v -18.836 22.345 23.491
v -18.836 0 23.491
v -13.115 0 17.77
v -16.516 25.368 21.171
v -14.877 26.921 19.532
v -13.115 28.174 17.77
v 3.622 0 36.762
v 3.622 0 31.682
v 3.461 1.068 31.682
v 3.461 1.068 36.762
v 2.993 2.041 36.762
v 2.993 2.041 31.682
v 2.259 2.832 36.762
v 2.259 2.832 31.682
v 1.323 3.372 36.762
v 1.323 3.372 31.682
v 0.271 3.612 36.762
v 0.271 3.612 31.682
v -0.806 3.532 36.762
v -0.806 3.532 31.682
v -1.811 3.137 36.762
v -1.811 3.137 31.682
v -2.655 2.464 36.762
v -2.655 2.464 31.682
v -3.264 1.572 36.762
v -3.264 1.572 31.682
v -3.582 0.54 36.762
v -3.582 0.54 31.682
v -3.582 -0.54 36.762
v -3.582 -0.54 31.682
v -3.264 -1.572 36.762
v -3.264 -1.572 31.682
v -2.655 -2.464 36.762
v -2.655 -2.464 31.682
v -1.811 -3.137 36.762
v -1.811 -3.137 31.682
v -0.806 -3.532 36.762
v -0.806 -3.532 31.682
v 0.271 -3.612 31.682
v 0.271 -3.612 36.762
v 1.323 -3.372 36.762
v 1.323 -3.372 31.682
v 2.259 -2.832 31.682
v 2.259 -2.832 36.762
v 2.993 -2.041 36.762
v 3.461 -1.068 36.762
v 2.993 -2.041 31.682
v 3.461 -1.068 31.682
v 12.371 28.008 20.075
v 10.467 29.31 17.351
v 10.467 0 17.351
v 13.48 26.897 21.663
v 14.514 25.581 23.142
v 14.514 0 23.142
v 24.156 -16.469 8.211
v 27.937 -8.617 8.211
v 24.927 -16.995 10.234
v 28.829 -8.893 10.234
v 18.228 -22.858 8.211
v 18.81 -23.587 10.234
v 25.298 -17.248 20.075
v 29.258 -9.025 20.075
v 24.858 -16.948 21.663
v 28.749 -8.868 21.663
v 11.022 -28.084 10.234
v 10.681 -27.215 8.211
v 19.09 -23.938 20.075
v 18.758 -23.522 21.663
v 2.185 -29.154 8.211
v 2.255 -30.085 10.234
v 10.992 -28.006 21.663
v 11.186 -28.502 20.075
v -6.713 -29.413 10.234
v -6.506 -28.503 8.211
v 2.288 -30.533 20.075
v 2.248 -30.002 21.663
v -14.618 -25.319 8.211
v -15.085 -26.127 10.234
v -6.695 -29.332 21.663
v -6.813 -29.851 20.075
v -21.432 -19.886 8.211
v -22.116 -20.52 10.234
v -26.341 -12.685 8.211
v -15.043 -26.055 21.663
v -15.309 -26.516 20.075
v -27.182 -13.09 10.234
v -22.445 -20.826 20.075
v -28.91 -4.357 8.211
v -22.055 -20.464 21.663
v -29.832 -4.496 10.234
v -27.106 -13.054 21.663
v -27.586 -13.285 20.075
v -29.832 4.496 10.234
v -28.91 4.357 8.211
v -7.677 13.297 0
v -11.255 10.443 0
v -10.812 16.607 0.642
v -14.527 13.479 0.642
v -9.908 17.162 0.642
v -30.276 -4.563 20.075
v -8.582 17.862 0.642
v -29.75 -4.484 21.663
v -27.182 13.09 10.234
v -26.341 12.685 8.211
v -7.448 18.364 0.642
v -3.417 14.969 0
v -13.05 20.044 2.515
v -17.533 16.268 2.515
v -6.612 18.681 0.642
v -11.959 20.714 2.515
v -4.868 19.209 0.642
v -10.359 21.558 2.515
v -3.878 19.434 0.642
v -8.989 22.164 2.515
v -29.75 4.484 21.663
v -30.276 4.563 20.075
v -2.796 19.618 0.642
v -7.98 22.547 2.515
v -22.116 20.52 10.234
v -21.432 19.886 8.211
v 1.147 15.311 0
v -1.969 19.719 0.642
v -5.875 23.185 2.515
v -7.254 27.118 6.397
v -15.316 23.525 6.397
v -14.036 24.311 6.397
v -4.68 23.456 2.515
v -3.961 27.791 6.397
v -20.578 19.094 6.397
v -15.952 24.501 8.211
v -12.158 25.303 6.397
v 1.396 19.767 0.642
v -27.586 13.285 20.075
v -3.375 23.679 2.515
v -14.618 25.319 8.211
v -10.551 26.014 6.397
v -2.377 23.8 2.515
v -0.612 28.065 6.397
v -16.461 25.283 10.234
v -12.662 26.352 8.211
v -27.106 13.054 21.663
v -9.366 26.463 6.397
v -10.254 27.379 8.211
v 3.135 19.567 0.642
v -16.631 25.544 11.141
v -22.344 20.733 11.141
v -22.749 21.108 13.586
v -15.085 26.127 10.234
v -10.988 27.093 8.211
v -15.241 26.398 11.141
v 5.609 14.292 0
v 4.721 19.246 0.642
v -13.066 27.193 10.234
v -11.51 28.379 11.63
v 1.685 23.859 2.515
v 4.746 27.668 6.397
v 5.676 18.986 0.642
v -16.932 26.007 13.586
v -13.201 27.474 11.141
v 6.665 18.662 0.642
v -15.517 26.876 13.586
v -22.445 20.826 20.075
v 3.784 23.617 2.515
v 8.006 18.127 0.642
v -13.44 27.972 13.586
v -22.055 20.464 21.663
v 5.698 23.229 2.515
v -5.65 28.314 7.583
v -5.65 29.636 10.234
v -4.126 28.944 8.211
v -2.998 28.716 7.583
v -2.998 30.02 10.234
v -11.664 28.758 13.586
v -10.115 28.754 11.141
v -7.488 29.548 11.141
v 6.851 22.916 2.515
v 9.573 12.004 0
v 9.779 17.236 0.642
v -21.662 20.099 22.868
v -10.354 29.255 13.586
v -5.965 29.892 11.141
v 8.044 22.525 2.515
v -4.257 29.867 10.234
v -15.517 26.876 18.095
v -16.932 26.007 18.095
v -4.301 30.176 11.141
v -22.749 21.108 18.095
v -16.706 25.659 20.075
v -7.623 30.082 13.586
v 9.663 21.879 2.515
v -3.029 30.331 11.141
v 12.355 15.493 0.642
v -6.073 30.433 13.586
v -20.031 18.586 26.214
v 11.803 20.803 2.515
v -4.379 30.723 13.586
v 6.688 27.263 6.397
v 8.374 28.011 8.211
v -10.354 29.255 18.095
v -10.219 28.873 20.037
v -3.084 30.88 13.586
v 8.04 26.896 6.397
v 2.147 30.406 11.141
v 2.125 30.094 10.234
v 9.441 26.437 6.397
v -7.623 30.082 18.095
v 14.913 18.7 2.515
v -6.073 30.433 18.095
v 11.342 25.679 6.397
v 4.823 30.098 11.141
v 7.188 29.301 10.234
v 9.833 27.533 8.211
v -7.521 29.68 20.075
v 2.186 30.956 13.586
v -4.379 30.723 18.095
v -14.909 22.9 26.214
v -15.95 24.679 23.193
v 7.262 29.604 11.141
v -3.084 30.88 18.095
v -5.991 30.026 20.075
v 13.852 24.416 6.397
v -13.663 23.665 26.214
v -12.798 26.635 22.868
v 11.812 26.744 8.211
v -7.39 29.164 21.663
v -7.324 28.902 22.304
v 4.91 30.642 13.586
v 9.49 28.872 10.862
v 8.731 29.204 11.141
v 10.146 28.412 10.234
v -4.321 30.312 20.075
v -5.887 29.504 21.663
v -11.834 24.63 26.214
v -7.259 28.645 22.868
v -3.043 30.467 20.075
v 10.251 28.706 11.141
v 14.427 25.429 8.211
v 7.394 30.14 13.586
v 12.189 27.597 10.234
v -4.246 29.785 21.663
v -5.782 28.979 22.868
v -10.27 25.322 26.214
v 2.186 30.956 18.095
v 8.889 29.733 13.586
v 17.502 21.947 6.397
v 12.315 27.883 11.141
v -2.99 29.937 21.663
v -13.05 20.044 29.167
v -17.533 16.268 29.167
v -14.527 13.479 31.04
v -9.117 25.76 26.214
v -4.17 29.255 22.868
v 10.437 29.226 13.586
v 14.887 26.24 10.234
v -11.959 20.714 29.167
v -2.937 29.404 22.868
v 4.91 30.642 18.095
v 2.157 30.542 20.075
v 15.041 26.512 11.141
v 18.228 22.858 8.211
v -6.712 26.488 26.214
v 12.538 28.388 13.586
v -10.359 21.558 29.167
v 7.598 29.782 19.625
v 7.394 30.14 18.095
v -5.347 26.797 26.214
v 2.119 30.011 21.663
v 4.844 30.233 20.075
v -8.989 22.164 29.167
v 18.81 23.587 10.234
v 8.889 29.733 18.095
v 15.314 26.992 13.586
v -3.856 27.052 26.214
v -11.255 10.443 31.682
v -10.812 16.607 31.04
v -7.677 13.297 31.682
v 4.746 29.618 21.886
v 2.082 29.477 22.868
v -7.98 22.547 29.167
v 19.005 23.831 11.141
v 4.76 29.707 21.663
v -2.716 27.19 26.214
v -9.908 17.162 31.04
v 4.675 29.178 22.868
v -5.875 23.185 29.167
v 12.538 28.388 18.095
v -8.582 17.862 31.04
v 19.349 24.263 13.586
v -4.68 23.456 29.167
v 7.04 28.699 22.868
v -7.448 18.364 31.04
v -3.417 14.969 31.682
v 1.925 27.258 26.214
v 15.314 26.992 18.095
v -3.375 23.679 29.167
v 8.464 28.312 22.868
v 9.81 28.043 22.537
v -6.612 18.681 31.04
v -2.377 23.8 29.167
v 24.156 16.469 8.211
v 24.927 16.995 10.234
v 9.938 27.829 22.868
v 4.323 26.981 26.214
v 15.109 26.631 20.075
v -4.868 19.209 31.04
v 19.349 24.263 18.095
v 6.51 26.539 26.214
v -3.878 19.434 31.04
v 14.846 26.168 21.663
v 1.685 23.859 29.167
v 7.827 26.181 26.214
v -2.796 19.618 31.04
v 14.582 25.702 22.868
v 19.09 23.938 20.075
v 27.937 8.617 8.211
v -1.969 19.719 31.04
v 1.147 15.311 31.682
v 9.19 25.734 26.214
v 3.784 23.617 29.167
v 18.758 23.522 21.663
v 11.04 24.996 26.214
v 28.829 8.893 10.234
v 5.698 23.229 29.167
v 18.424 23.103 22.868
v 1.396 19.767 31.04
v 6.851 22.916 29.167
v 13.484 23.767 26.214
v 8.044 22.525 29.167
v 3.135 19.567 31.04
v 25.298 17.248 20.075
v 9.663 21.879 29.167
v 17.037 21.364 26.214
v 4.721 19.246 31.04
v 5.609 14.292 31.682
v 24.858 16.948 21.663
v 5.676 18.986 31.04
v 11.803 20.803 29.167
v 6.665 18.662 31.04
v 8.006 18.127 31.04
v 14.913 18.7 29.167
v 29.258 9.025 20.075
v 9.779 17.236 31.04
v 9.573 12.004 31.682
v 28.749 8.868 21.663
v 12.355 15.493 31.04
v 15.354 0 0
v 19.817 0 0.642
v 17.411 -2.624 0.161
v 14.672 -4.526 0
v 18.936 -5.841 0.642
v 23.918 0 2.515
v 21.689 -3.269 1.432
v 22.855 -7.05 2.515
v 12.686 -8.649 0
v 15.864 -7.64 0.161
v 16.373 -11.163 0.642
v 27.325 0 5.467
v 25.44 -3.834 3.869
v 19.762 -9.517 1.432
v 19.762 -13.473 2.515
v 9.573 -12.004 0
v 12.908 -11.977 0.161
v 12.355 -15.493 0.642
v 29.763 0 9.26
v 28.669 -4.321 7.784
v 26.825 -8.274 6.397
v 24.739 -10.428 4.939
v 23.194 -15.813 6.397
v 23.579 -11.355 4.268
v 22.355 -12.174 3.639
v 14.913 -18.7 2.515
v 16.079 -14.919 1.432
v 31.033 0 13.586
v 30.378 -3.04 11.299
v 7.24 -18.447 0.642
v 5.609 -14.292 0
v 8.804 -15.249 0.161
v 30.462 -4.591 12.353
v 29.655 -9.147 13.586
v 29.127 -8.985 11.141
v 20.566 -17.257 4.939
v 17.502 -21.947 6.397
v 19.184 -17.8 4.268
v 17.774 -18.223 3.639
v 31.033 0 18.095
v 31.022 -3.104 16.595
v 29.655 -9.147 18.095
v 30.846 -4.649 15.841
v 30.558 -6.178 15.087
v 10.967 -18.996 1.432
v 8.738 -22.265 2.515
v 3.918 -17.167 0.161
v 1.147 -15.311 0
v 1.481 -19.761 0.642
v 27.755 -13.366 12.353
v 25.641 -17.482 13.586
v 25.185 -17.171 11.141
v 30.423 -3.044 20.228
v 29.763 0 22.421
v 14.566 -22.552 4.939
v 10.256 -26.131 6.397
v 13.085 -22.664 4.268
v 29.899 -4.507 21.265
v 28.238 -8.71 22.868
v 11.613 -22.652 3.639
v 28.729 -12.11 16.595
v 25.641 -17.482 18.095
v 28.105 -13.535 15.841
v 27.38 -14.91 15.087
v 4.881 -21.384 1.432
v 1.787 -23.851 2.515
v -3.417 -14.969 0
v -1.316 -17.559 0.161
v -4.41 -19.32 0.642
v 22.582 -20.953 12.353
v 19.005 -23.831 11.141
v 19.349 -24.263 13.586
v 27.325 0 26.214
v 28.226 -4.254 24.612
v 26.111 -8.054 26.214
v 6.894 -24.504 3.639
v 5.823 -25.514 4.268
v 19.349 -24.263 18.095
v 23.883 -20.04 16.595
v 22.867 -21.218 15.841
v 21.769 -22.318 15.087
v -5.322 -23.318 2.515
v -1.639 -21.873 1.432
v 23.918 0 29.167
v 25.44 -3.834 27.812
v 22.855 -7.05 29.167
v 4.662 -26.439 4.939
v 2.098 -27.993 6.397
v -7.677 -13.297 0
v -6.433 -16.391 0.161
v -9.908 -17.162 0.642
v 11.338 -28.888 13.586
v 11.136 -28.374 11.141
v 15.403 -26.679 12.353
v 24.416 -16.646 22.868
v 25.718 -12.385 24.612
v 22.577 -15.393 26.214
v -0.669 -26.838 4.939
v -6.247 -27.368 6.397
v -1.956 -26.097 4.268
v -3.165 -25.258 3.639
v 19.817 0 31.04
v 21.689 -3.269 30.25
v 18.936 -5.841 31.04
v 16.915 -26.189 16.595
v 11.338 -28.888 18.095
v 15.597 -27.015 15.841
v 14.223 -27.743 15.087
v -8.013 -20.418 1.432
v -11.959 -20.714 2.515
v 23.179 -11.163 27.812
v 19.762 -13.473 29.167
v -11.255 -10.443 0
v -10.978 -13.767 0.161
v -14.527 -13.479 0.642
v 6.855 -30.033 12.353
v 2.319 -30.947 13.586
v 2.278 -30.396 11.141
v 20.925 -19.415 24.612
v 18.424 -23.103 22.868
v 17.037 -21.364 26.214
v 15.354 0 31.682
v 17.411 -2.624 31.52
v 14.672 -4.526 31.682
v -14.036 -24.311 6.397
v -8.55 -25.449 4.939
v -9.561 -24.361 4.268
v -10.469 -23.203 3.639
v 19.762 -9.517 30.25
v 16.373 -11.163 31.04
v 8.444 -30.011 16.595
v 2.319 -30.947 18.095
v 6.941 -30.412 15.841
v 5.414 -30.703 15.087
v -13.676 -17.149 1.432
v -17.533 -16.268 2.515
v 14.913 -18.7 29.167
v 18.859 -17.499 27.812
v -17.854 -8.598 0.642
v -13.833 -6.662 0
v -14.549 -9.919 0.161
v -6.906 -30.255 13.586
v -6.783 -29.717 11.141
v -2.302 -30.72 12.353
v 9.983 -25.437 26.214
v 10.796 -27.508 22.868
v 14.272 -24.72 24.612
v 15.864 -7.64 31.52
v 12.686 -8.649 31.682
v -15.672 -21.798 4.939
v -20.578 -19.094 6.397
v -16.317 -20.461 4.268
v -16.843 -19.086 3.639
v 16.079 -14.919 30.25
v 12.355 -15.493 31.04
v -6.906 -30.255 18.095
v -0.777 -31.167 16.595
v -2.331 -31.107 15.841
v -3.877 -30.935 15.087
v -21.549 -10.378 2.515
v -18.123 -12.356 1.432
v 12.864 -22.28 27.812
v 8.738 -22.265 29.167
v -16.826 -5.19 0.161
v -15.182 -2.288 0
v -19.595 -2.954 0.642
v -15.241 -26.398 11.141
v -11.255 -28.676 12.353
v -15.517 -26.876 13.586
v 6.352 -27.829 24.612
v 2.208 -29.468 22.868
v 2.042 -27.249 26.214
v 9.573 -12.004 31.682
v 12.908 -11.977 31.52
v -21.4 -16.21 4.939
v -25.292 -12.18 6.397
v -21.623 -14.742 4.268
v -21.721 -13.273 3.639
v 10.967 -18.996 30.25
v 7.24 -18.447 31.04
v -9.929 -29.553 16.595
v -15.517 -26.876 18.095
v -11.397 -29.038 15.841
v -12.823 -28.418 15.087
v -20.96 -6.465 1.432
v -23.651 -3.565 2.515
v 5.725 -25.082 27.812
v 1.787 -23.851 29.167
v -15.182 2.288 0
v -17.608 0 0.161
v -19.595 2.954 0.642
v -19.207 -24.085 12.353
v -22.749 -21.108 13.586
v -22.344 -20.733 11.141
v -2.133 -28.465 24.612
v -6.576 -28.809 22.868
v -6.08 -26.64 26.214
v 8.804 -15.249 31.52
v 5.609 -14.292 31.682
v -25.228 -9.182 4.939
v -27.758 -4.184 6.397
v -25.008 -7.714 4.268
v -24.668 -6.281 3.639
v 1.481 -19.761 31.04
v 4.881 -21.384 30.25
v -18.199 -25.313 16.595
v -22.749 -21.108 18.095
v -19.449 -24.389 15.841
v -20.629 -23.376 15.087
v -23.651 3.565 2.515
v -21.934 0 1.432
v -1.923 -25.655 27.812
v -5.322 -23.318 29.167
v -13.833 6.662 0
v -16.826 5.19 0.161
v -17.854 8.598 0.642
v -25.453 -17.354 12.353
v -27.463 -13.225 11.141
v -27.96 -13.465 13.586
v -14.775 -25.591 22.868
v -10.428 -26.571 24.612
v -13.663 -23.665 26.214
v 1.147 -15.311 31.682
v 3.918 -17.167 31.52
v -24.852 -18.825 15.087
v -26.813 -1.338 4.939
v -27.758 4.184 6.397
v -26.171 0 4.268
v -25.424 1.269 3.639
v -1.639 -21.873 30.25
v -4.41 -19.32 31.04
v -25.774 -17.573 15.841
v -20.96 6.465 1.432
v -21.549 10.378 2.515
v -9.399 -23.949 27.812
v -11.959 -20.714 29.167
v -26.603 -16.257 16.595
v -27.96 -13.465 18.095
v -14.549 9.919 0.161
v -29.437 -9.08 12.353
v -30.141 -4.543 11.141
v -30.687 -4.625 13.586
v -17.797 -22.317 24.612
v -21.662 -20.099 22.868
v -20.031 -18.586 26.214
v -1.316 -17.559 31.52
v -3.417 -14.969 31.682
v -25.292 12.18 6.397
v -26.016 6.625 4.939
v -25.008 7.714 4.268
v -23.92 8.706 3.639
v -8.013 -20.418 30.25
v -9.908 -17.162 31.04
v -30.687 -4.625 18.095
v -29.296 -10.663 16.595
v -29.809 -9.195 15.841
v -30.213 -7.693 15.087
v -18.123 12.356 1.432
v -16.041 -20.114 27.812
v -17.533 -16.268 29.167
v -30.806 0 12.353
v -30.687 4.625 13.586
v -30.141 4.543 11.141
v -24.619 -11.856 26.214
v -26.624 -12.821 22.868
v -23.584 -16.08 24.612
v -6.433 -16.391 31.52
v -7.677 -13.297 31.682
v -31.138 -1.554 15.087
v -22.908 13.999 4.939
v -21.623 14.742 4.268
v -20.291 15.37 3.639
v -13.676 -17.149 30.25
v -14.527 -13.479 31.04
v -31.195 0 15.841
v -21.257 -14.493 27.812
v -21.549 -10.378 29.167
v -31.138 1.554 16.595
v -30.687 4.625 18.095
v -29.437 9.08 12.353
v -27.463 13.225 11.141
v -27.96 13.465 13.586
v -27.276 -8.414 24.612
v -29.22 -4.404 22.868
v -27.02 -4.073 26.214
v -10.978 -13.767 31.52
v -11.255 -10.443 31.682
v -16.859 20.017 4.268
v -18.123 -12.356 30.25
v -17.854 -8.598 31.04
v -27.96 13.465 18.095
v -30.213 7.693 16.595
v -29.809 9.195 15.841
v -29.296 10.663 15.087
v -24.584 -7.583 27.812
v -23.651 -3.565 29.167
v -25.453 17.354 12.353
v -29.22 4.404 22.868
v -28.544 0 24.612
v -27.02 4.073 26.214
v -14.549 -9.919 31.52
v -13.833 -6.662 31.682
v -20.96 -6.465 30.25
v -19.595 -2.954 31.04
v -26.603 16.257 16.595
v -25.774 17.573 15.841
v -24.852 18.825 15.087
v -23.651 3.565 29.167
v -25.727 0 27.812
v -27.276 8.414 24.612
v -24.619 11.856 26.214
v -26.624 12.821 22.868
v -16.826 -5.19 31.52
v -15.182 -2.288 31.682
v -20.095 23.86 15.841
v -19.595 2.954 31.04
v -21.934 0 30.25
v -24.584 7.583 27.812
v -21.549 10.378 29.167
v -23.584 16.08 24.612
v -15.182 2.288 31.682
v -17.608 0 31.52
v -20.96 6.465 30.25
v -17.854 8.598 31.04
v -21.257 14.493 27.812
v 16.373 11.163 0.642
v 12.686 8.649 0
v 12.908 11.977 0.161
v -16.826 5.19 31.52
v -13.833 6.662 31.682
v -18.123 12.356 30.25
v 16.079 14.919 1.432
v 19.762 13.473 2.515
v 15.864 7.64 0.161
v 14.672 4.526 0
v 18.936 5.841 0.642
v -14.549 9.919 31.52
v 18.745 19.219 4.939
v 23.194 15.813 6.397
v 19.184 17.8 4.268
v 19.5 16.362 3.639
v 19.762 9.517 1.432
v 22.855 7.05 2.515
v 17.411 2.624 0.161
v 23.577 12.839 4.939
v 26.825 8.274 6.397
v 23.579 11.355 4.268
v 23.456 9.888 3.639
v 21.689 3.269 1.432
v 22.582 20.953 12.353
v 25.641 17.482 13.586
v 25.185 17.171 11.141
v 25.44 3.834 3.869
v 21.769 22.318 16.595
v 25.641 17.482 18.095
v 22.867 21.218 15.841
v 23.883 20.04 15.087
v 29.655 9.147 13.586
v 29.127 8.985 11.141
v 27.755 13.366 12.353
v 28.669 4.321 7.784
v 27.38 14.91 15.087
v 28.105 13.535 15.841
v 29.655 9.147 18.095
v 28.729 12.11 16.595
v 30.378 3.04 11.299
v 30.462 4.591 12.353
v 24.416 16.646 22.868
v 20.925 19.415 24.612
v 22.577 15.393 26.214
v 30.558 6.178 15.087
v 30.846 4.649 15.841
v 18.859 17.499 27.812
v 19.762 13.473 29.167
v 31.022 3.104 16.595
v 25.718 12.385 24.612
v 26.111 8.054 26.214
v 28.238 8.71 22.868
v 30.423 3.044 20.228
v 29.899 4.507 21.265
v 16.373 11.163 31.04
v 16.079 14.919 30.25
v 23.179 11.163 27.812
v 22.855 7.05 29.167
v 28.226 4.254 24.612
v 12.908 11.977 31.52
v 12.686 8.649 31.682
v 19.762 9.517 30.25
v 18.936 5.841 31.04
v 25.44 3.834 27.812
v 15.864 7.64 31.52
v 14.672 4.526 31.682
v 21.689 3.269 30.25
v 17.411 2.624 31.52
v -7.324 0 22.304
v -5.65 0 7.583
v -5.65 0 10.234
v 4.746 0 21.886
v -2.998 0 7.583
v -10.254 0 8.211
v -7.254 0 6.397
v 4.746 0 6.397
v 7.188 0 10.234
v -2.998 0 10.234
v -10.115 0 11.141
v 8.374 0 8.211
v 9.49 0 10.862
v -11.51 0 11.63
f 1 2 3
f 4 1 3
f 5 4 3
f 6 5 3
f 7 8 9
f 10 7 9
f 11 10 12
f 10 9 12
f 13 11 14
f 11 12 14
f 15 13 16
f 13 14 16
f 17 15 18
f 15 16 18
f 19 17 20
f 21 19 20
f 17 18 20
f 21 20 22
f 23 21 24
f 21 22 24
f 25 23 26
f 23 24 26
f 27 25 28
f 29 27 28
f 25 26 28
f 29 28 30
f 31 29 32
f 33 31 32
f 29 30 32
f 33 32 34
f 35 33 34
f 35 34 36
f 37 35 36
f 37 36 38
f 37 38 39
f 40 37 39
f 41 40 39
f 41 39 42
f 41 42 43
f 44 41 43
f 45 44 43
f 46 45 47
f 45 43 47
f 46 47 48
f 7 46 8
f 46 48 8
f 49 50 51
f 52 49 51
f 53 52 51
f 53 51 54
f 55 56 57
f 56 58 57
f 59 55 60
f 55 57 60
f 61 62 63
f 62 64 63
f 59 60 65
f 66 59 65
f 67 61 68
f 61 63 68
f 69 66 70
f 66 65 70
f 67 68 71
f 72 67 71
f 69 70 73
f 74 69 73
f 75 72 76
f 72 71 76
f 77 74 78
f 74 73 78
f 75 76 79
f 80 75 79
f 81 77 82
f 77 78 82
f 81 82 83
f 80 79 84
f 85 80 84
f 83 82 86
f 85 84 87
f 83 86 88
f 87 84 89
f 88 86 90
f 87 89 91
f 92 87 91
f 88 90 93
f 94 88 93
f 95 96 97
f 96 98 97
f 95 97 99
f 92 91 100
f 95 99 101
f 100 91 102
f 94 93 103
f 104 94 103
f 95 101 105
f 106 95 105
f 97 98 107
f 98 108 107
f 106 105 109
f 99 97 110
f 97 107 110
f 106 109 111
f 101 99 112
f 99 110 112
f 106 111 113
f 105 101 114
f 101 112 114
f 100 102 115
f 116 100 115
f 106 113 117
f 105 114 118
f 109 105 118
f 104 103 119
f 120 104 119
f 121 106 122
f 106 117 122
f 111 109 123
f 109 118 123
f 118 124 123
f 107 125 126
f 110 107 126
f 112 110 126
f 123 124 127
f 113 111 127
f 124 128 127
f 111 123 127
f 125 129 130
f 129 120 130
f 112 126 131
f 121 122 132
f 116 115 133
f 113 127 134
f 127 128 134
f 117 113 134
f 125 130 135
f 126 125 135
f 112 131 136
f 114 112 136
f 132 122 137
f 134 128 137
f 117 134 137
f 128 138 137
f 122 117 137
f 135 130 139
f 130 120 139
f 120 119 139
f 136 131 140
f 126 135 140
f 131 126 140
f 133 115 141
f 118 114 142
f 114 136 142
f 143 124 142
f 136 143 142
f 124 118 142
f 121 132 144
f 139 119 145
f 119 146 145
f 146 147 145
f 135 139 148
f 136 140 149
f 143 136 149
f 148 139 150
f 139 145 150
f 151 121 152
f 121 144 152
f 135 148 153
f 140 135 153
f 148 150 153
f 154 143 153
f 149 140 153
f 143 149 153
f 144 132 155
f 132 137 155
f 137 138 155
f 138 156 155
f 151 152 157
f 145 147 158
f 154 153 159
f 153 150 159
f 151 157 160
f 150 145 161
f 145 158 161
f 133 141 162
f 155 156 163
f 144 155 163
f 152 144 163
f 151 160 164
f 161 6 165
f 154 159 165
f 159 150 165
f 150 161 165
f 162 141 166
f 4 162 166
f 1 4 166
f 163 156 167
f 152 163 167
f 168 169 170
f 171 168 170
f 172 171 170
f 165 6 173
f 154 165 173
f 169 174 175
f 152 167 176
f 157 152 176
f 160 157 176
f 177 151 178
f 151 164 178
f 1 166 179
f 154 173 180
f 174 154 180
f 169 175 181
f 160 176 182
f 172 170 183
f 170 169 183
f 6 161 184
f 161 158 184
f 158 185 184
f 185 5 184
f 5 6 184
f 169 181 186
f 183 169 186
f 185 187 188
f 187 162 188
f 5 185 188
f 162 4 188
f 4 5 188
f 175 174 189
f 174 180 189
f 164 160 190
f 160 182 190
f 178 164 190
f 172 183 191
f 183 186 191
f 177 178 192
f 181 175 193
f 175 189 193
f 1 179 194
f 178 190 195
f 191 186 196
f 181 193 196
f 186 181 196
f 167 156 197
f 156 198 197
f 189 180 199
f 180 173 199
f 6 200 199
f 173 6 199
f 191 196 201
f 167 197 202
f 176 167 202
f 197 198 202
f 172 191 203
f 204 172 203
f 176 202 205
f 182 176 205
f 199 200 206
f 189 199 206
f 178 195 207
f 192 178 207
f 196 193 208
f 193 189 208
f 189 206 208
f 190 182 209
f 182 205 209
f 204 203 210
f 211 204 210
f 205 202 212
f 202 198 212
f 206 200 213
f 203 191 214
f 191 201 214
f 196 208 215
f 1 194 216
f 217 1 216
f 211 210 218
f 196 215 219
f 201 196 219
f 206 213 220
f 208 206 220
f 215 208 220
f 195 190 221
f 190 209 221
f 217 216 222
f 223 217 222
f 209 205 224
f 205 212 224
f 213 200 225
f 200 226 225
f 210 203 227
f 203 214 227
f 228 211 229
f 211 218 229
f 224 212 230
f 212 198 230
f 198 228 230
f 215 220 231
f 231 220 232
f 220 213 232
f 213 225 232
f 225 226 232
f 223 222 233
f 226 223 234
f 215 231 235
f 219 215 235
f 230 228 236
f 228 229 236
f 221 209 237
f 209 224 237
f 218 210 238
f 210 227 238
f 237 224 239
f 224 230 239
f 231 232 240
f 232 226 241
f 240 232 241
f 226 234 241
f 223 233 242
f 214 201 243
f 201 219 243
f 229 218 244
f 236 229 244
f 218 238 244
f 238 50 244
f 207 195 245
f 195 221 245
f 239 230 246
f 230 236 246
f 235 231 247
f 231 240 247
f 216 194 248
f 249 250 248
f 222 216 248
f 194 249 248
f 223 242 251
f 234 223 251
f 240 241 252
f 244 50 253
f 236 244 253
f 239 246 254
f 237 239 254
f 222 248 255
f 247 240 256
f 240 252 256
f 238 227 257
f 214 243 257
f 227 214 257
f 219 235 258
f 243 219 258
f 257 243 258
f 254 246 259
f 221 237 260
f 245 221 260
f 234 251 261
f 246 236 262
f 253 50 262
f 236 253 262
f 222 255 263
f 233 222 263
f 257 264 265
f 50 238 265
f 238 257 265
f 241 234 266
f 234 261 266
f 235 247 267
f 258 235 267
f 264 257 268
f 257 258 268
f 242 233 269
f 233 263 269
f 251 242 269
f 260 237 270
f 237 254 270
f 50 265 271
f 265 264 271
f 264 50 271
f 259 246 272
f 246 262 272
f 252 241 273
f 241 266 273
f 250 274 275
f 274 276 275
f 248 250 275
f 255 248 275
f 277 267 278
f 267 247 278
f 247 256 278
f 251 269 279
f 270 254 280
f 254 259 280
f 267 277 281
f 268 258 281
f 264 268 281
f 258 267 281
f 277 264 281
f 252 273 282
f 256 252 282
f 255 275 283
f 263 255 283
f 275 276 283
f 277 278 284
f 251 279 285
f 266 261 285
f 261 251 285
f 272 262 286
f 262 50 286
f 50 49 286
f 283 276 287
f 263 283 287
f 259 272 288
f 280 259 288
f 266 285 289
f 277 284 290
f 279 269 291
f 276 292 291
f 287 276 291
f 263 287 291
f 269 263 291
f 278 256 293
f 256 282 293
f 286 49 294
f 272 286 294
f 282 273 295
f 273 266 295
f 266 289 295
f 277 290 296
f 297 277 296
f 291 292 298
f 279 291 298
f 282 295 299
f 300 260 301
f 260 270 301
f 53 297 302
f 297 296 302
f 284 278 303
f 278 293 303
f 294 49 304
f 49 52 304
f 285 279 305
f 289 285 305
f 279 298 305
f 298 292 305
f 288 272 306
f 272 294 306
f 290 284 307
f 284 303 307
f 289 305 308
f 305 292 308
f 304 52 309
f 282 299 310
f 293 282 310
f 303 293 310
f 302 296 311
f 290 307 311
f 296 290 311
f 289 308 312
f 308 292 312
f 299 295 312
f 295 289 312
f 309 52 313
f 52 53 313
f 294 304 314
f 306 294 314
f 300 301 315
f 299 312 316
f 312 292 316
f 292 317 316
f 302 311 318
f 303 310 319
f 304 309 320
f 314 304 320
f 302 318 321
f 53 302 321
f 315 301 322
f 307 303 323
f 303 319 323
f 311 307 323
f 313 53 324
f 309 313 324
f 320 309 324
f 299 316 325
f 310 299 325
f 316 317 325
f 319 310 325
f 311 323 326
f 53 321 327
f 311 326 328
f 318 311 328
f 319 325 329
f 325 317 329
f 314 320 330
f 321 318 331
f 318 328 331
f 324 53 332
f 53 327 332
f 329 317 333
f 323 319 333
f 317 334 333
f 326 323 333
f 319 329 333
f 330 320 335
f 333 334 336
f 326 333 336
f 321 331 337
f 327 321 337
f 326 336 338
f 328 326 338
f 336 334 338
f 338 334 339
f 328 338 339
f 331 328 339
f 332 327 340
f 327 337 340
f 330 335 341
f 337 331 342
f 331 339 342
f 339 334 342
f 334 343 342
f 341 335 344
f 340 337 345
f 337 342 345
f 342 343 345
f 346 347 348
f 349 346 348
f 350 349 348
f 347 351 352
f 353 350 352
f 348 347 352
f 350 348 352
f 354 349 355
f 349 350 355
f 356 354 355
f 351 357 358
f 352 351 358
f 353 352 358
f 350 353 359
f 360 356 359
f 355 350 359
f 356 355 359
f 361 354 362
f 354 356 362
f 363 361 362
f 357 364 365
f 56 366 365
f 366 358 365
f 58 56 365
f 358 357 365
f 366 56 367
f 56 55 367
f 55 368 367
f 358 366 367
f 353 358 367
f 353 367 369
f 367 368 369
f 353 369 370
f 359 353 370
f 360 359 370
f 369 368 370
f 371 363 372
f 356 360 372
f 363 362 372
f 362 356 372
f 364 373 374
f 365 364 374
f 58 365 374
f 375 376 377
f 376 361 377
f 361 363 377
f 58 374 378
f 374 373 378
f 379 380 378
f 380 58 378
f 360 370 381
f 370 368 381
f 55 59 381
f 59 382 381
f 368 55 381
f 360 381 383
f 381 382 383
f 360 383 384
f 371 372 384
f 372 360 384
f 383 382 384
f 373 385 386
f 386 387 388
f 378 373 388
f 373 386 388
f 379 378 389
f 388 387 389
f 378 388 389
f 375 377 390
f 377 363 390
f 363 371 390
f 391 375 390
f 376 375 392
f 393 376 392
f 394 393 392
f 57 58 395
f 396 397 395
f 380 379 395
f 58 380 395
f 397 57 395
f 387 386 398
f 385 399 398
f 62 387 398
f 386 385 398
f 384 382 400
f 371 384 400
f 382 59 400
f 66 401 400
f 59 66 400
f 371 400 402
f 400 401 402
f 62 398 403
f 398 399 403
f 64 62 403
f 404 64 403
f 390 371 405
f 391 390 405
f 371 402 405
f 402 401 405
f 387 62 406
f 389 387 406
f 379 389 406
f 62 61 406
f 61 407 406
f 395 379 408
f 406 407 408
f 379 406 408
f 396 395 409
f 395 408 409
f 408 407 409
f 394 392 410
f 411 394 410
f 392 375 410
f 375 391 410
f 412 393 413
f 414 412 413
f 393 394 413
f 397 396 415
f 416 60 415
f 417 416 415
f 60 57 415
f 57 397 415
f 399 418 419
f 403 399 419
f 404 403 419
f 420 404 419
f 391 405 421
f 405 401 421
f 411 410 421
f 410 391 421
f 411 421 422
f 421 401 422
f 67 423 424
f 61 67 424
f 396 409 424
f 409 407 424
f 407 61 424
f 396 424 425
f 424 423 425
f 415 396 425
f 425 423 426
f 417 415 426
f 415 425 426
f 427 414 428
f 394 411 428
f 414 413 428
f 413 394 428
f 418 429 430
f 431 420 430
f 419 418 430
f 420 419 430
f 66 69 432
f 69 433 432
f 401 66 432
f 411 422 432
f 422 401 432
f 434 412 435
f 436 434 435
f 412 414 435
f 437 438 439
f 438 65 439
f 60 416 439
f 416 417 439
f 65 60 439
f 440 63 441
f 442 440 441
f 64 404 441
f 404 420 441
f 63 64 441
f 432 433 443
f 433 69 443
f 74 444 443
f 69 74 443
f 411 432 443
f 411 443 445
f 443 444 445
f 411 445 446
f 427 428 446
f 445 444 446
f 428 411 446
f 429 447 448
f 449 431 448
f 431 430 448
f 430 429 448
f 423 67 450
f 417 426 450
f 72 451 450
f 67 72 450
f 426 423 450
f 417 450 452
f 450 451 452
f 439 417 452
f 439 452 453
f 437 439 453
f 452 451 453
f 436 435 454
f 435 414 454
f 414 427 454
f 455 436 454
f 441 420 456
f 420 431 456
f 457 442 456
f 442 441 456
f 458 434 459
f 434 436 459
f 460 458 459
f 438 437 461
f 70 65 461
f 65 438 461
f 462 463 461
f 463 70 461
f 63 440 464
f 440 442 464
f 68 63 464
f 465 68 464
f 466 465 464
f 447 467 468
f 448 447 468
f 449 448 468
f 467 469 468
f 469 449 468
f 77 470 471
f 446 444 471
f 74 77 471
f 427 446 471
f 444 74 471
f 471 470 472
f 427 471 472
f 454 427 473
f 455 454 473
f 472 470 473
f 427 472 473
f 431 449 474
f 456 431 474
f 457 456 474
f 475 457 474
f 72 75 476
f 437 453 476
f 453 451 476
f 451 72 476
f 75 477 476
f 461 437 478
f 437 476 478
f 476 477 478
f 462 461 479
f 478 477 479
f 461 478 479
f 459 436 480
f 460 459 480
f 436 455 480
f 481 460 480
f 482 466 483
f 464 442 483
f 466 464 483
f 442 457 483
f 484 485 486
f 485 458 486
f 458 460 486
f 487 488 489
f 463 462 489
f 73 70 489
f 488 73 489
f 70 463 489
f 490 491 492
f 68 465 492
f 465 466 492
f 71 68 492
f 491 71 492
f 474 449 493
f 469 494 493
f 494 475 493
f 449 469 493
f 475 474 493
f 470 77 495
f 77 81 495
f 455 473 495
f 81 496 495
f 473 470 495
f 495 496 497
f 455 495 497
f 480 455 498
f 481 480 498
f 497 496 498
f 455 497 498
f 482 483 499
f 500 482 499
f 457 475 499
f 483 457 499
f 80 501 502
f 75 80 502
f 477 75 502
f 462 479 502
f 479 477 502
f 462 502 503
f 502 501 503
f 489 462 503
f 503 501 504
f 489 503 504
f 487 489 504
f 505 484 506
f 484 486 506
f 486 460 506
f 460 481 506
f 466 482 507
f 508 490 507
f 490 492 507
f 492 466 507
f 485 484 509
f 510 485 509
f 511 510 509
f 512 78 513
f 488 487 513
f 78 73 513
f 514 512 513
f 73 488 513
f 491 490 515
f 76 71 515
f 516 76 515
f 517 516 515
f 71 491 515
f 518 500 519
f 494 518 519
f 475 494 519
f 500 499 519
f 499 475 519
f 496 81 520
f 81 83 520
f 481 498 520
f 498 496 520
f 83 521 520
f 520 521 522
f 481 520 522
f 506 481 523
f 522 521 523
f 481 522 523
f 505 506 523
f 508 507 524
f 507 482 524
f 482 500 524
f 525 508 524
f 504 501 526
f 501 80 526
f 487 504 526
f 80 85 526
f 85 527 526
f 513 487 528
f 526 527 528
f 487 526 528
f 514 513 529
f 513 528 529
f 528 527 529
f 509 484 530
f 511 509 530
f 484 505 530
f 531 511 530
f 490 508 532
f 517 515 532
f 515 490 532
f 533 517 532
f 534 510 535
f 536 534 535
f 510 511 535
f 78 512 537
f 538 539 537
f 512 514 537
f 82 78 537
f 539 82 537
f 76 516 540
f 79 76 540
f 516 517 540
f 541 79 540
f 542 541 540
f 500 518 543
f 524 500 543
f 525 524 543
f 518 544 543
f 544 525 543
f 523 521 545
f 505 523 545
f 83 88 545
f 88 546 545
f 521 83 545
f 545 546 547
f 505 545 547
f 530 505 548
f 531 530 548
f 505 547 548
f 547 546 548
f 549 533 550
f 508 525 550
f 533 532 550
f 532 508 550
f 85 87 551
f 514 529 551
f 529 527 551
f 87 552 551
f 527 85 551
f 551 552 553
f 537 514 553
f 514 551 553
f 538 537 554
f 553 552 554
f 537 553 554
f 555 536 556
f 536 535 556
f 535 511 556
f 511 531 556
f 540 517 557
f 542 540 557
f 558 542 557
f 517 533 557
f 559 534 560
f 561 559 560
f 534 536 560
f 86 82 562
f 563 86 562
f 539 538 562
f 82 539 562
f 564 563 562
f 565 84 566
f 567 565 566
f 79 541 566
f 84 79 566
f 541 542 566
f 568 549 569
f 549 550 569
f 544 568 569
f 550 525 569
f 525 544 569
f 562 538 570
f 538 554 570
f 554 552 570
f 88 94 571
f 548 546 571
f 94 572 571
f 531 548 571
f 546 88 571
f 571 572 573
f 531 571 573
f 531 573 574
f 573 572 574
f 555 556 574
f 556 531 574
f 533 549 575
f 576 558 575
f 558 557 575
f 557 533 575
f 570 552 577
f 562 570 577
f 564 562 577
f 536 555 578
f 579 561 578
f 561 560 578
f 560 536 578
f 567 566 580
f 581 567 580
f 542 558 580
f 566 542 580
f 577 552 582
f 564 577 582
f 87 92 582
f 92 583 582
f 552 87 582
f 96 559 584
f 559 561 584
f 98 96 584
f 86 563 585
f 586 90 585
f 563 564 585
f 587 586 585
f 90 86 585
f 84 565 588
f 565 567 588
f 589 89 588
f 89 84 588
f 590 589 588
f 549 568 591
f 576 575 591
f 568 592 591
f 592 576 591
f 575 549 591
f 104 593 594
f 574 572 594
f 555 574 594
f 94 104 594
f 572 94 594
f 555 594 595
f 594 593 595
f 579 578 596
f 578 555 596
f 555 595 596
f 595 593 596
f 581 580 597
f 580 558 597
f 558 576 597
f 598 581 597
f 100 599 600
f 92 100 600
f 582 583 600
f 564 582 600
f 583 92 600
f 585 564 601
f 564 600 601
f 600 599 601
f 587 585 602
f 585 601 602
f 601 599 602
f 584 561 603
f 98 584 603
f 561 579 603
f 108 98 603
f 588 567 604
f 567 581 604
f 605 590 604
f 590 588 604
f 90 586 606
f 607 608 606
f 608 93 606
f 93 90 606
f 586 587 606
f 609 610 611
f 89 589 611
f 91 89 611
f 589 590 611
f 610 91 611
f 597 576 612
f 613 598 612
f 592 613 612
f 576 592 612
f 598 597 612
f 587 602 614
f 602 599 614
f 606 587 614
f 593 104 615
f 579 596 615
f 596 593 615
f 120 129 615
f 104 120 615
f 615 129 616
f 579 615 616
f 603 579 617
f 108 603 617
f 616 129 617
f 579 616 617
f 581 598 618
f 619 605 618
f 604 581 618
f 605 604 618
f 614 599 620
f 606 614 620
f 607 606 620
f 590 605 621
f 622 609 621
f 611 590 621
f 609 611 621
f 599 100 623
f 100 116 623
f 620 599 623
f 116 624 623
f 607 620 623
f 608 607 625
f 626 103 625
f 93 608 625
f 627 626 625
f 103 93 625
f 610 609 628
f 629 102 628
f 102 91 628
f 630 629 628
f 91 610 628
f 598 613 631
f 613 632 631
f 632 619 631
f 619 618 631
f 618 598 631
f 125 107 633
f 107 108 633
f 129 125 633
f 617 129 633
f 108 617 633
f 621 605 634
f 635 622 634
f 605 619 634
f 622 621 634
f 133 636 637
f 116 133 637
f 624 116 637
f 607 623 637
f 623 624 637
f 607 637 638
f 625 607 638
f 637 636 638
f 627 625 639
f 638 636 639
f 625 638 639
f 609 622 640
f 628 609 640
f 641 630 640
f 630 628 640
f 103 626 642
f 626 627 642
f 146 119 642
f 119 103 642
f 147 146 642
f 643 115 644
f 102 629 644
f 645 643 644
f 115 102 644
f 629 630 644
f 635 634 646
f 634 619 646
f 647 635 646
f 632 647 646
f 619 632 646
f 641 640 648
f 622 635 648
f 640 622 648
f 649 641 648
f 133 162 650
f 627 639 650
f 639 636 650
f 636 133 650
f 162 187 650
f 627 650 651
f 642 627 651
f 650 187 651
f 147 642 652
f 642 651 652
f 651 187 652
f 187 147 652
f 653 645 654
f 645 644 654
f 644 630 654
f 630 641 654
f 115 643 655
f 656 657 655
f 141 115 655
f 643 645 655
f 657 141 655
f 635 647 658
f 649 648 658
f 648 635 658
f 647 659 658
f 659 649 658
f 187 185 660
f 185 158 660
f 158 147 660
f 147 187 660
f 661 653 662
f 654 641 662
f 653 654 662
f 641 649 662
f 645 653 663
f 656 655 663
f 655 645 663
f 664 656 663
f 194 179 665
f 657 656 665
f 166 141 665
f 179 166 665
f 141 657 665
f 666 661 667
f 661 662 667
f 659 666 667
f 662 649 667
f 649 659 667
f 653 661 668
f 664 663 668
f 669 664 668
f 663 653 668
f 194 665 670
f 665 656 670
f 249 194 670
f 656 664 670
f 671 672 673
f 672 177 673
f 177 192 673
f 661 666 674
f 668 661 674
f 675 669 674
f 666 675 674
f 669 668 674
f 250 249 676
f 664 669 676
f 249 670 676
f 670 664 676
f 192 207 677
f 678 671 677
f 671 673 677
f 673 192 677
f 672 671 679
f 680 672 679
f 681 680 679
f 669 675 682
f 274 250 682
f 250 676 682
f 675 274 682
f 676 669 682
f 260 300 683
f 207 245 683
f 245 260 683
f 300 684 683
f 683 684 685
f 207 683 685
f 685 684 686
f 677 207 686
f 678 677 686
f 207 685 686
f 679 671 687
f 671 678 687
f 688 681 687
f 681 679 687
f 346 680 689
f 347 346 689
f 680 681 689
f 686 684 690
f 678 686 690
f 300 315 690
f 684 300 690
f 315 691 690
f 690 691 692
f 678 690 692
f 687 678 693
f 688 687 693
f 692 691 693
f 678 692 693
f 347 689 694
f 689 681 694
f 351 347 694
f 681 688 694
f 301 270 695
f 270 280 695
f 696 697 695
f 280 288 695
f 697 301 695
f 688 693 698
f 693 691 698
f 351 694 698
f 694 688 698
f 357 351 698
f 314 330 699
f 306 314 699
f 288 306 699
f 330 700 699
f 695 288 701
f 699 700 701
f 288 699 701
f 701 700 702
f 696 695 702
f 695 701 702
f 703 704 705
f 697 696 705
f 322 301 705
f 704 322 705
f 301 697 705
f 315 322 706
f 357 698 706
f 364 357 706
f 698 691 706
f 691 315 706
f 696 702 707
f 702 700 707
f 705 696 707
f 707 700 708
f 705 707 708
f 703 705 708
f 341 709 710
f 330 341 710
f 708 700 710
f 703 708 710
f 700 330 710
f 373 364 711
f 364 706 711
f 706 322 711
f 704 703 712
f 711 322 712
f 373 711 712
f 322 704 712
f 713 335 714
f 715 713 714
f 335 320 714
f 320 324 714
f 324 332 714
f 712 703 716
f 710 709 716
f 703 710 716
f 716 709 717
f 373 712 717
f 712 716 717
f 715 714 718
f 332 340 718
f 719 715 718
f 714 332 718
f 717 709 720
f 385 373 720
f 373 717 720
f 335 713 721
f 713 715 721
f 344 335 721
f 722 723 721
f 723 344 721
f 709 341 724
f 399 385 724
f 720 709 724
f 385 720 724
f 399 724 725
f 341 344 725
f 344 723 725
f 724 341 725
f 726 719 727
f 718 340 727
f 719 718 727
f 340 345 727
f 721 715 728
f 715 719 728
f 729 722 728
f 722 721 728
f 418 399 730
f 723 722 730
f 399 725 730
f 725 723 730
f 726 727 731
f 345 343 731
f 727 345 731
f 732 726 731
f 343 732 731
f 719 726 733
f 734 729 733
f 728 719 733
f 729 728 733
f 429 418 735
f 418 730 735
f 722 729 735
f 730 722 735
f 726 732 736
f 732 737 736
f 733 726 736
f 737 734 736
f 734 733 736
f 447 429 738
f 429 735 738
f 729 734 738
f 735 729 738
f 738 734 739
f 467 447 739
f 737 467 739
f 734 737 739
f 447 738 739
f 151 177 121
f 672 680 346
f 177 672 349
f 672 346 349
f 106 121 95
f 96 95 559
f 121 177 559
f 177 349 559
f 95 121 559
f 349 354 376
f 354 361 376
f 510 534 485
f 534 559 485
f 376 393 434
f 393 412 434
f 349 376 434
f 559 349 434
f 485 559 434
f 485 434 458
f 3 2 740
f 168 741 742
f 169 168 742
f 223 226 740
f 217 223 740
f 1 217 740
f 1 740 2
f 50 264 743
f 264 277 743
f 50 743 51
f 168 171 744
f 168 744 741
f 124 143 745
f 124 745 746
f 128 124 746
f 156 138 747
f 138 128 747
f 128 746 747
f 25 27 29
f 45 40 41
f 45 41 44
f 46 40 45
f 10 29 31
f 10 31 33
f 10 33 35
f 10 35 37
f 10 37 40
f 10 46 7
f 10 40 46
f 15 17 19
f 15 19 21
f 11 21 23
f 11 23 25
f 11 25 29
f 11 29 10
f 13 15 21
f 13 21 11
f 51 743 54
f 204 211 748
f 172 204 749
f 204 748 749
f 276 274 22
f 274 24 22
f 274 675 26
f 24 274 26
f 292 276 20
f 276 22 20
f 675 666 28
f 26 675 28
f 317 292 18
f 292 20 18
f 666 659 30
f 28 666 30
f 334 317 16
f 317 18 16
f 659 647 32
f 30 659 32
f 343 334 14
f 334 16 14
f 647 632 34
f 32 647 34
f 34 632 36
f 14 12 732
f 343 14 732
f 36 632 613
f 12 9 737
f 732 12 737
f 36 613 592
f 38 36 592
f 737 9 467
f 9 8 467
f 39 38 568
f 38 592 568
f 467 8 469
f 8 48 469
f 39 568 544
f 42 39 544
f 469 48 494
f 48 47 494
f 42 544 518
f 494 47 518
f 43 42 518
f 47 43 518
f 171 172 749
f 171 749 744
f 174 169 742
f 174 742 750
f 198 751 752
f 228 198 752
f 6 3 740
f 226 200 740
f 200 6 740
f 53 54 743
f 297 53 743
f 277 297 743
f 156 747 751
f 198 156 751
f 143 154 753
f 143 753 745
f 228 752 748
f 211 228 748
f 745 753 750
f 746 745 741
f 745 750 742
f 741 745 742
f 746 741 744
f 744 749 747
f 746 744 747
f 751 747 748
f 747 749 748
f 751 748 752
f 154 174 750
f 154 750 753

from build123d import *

# Parameters (mm, degrees)
F2_R     = 3.622421
F3_DEPTH = 5.08
F5_DEPTH = 50.8


with BuildPart() as f1:
    # F0 (on Front) → F1 (revolve)
    with BuildSketch(Plane.XZ):
        with BuildLine():
            Line((0, 31.681616), (0, 0))
            Line((0, 0), (15.353743, 0))
            ThreePointArc((15.353743, 0), (31.194551, 15.840808), (15.353743, 31.681616))
            Line((15.353743, 31.681616), (0, 31.681616))
        make_face()
    revolve(axis=Axis((0, 0, 15.840808), (0, 0, -1)))

    # F2 (on face) → F3 (join)
    with BuildSketch(Plane.XY.offset(31.681616)):
        Circle(F2_R)
    extrude(amount=F3_DEPTH)

    # F4 (on Front) → F5 (cut)
    with BuildSketch(Plane.XZ):
        Polygon((-13.114861, 17.769501), (-7.324063, 22.304462), (-18.835891, 23.490531), align=None)
        Polygon((14.513528, 23.141688), (4.745915, 21.885851), (10.466945, 17.350888), align=None)
        Polygon((-5.649615, 10.234484), (-10.114809, 11.141478), (-11.510182, 11.629858), (-10.254347, 8.211194), (-7.254294, 6.397209), (-3.207712, 6.397209), (1.536557, 6.397209), (4.745915, 6.397209), (8.373886, 8.211194), (9.490184, 10.862403), (7.187818, 10.234484), (-2.998406, 10.234484), (-2.998406, 7.583275), (-5.649615, 7.583275), align=None)
    extrude(amount=-F5_DEPTH, mode=Mode.SUBTRACT)


solid = f1.part
